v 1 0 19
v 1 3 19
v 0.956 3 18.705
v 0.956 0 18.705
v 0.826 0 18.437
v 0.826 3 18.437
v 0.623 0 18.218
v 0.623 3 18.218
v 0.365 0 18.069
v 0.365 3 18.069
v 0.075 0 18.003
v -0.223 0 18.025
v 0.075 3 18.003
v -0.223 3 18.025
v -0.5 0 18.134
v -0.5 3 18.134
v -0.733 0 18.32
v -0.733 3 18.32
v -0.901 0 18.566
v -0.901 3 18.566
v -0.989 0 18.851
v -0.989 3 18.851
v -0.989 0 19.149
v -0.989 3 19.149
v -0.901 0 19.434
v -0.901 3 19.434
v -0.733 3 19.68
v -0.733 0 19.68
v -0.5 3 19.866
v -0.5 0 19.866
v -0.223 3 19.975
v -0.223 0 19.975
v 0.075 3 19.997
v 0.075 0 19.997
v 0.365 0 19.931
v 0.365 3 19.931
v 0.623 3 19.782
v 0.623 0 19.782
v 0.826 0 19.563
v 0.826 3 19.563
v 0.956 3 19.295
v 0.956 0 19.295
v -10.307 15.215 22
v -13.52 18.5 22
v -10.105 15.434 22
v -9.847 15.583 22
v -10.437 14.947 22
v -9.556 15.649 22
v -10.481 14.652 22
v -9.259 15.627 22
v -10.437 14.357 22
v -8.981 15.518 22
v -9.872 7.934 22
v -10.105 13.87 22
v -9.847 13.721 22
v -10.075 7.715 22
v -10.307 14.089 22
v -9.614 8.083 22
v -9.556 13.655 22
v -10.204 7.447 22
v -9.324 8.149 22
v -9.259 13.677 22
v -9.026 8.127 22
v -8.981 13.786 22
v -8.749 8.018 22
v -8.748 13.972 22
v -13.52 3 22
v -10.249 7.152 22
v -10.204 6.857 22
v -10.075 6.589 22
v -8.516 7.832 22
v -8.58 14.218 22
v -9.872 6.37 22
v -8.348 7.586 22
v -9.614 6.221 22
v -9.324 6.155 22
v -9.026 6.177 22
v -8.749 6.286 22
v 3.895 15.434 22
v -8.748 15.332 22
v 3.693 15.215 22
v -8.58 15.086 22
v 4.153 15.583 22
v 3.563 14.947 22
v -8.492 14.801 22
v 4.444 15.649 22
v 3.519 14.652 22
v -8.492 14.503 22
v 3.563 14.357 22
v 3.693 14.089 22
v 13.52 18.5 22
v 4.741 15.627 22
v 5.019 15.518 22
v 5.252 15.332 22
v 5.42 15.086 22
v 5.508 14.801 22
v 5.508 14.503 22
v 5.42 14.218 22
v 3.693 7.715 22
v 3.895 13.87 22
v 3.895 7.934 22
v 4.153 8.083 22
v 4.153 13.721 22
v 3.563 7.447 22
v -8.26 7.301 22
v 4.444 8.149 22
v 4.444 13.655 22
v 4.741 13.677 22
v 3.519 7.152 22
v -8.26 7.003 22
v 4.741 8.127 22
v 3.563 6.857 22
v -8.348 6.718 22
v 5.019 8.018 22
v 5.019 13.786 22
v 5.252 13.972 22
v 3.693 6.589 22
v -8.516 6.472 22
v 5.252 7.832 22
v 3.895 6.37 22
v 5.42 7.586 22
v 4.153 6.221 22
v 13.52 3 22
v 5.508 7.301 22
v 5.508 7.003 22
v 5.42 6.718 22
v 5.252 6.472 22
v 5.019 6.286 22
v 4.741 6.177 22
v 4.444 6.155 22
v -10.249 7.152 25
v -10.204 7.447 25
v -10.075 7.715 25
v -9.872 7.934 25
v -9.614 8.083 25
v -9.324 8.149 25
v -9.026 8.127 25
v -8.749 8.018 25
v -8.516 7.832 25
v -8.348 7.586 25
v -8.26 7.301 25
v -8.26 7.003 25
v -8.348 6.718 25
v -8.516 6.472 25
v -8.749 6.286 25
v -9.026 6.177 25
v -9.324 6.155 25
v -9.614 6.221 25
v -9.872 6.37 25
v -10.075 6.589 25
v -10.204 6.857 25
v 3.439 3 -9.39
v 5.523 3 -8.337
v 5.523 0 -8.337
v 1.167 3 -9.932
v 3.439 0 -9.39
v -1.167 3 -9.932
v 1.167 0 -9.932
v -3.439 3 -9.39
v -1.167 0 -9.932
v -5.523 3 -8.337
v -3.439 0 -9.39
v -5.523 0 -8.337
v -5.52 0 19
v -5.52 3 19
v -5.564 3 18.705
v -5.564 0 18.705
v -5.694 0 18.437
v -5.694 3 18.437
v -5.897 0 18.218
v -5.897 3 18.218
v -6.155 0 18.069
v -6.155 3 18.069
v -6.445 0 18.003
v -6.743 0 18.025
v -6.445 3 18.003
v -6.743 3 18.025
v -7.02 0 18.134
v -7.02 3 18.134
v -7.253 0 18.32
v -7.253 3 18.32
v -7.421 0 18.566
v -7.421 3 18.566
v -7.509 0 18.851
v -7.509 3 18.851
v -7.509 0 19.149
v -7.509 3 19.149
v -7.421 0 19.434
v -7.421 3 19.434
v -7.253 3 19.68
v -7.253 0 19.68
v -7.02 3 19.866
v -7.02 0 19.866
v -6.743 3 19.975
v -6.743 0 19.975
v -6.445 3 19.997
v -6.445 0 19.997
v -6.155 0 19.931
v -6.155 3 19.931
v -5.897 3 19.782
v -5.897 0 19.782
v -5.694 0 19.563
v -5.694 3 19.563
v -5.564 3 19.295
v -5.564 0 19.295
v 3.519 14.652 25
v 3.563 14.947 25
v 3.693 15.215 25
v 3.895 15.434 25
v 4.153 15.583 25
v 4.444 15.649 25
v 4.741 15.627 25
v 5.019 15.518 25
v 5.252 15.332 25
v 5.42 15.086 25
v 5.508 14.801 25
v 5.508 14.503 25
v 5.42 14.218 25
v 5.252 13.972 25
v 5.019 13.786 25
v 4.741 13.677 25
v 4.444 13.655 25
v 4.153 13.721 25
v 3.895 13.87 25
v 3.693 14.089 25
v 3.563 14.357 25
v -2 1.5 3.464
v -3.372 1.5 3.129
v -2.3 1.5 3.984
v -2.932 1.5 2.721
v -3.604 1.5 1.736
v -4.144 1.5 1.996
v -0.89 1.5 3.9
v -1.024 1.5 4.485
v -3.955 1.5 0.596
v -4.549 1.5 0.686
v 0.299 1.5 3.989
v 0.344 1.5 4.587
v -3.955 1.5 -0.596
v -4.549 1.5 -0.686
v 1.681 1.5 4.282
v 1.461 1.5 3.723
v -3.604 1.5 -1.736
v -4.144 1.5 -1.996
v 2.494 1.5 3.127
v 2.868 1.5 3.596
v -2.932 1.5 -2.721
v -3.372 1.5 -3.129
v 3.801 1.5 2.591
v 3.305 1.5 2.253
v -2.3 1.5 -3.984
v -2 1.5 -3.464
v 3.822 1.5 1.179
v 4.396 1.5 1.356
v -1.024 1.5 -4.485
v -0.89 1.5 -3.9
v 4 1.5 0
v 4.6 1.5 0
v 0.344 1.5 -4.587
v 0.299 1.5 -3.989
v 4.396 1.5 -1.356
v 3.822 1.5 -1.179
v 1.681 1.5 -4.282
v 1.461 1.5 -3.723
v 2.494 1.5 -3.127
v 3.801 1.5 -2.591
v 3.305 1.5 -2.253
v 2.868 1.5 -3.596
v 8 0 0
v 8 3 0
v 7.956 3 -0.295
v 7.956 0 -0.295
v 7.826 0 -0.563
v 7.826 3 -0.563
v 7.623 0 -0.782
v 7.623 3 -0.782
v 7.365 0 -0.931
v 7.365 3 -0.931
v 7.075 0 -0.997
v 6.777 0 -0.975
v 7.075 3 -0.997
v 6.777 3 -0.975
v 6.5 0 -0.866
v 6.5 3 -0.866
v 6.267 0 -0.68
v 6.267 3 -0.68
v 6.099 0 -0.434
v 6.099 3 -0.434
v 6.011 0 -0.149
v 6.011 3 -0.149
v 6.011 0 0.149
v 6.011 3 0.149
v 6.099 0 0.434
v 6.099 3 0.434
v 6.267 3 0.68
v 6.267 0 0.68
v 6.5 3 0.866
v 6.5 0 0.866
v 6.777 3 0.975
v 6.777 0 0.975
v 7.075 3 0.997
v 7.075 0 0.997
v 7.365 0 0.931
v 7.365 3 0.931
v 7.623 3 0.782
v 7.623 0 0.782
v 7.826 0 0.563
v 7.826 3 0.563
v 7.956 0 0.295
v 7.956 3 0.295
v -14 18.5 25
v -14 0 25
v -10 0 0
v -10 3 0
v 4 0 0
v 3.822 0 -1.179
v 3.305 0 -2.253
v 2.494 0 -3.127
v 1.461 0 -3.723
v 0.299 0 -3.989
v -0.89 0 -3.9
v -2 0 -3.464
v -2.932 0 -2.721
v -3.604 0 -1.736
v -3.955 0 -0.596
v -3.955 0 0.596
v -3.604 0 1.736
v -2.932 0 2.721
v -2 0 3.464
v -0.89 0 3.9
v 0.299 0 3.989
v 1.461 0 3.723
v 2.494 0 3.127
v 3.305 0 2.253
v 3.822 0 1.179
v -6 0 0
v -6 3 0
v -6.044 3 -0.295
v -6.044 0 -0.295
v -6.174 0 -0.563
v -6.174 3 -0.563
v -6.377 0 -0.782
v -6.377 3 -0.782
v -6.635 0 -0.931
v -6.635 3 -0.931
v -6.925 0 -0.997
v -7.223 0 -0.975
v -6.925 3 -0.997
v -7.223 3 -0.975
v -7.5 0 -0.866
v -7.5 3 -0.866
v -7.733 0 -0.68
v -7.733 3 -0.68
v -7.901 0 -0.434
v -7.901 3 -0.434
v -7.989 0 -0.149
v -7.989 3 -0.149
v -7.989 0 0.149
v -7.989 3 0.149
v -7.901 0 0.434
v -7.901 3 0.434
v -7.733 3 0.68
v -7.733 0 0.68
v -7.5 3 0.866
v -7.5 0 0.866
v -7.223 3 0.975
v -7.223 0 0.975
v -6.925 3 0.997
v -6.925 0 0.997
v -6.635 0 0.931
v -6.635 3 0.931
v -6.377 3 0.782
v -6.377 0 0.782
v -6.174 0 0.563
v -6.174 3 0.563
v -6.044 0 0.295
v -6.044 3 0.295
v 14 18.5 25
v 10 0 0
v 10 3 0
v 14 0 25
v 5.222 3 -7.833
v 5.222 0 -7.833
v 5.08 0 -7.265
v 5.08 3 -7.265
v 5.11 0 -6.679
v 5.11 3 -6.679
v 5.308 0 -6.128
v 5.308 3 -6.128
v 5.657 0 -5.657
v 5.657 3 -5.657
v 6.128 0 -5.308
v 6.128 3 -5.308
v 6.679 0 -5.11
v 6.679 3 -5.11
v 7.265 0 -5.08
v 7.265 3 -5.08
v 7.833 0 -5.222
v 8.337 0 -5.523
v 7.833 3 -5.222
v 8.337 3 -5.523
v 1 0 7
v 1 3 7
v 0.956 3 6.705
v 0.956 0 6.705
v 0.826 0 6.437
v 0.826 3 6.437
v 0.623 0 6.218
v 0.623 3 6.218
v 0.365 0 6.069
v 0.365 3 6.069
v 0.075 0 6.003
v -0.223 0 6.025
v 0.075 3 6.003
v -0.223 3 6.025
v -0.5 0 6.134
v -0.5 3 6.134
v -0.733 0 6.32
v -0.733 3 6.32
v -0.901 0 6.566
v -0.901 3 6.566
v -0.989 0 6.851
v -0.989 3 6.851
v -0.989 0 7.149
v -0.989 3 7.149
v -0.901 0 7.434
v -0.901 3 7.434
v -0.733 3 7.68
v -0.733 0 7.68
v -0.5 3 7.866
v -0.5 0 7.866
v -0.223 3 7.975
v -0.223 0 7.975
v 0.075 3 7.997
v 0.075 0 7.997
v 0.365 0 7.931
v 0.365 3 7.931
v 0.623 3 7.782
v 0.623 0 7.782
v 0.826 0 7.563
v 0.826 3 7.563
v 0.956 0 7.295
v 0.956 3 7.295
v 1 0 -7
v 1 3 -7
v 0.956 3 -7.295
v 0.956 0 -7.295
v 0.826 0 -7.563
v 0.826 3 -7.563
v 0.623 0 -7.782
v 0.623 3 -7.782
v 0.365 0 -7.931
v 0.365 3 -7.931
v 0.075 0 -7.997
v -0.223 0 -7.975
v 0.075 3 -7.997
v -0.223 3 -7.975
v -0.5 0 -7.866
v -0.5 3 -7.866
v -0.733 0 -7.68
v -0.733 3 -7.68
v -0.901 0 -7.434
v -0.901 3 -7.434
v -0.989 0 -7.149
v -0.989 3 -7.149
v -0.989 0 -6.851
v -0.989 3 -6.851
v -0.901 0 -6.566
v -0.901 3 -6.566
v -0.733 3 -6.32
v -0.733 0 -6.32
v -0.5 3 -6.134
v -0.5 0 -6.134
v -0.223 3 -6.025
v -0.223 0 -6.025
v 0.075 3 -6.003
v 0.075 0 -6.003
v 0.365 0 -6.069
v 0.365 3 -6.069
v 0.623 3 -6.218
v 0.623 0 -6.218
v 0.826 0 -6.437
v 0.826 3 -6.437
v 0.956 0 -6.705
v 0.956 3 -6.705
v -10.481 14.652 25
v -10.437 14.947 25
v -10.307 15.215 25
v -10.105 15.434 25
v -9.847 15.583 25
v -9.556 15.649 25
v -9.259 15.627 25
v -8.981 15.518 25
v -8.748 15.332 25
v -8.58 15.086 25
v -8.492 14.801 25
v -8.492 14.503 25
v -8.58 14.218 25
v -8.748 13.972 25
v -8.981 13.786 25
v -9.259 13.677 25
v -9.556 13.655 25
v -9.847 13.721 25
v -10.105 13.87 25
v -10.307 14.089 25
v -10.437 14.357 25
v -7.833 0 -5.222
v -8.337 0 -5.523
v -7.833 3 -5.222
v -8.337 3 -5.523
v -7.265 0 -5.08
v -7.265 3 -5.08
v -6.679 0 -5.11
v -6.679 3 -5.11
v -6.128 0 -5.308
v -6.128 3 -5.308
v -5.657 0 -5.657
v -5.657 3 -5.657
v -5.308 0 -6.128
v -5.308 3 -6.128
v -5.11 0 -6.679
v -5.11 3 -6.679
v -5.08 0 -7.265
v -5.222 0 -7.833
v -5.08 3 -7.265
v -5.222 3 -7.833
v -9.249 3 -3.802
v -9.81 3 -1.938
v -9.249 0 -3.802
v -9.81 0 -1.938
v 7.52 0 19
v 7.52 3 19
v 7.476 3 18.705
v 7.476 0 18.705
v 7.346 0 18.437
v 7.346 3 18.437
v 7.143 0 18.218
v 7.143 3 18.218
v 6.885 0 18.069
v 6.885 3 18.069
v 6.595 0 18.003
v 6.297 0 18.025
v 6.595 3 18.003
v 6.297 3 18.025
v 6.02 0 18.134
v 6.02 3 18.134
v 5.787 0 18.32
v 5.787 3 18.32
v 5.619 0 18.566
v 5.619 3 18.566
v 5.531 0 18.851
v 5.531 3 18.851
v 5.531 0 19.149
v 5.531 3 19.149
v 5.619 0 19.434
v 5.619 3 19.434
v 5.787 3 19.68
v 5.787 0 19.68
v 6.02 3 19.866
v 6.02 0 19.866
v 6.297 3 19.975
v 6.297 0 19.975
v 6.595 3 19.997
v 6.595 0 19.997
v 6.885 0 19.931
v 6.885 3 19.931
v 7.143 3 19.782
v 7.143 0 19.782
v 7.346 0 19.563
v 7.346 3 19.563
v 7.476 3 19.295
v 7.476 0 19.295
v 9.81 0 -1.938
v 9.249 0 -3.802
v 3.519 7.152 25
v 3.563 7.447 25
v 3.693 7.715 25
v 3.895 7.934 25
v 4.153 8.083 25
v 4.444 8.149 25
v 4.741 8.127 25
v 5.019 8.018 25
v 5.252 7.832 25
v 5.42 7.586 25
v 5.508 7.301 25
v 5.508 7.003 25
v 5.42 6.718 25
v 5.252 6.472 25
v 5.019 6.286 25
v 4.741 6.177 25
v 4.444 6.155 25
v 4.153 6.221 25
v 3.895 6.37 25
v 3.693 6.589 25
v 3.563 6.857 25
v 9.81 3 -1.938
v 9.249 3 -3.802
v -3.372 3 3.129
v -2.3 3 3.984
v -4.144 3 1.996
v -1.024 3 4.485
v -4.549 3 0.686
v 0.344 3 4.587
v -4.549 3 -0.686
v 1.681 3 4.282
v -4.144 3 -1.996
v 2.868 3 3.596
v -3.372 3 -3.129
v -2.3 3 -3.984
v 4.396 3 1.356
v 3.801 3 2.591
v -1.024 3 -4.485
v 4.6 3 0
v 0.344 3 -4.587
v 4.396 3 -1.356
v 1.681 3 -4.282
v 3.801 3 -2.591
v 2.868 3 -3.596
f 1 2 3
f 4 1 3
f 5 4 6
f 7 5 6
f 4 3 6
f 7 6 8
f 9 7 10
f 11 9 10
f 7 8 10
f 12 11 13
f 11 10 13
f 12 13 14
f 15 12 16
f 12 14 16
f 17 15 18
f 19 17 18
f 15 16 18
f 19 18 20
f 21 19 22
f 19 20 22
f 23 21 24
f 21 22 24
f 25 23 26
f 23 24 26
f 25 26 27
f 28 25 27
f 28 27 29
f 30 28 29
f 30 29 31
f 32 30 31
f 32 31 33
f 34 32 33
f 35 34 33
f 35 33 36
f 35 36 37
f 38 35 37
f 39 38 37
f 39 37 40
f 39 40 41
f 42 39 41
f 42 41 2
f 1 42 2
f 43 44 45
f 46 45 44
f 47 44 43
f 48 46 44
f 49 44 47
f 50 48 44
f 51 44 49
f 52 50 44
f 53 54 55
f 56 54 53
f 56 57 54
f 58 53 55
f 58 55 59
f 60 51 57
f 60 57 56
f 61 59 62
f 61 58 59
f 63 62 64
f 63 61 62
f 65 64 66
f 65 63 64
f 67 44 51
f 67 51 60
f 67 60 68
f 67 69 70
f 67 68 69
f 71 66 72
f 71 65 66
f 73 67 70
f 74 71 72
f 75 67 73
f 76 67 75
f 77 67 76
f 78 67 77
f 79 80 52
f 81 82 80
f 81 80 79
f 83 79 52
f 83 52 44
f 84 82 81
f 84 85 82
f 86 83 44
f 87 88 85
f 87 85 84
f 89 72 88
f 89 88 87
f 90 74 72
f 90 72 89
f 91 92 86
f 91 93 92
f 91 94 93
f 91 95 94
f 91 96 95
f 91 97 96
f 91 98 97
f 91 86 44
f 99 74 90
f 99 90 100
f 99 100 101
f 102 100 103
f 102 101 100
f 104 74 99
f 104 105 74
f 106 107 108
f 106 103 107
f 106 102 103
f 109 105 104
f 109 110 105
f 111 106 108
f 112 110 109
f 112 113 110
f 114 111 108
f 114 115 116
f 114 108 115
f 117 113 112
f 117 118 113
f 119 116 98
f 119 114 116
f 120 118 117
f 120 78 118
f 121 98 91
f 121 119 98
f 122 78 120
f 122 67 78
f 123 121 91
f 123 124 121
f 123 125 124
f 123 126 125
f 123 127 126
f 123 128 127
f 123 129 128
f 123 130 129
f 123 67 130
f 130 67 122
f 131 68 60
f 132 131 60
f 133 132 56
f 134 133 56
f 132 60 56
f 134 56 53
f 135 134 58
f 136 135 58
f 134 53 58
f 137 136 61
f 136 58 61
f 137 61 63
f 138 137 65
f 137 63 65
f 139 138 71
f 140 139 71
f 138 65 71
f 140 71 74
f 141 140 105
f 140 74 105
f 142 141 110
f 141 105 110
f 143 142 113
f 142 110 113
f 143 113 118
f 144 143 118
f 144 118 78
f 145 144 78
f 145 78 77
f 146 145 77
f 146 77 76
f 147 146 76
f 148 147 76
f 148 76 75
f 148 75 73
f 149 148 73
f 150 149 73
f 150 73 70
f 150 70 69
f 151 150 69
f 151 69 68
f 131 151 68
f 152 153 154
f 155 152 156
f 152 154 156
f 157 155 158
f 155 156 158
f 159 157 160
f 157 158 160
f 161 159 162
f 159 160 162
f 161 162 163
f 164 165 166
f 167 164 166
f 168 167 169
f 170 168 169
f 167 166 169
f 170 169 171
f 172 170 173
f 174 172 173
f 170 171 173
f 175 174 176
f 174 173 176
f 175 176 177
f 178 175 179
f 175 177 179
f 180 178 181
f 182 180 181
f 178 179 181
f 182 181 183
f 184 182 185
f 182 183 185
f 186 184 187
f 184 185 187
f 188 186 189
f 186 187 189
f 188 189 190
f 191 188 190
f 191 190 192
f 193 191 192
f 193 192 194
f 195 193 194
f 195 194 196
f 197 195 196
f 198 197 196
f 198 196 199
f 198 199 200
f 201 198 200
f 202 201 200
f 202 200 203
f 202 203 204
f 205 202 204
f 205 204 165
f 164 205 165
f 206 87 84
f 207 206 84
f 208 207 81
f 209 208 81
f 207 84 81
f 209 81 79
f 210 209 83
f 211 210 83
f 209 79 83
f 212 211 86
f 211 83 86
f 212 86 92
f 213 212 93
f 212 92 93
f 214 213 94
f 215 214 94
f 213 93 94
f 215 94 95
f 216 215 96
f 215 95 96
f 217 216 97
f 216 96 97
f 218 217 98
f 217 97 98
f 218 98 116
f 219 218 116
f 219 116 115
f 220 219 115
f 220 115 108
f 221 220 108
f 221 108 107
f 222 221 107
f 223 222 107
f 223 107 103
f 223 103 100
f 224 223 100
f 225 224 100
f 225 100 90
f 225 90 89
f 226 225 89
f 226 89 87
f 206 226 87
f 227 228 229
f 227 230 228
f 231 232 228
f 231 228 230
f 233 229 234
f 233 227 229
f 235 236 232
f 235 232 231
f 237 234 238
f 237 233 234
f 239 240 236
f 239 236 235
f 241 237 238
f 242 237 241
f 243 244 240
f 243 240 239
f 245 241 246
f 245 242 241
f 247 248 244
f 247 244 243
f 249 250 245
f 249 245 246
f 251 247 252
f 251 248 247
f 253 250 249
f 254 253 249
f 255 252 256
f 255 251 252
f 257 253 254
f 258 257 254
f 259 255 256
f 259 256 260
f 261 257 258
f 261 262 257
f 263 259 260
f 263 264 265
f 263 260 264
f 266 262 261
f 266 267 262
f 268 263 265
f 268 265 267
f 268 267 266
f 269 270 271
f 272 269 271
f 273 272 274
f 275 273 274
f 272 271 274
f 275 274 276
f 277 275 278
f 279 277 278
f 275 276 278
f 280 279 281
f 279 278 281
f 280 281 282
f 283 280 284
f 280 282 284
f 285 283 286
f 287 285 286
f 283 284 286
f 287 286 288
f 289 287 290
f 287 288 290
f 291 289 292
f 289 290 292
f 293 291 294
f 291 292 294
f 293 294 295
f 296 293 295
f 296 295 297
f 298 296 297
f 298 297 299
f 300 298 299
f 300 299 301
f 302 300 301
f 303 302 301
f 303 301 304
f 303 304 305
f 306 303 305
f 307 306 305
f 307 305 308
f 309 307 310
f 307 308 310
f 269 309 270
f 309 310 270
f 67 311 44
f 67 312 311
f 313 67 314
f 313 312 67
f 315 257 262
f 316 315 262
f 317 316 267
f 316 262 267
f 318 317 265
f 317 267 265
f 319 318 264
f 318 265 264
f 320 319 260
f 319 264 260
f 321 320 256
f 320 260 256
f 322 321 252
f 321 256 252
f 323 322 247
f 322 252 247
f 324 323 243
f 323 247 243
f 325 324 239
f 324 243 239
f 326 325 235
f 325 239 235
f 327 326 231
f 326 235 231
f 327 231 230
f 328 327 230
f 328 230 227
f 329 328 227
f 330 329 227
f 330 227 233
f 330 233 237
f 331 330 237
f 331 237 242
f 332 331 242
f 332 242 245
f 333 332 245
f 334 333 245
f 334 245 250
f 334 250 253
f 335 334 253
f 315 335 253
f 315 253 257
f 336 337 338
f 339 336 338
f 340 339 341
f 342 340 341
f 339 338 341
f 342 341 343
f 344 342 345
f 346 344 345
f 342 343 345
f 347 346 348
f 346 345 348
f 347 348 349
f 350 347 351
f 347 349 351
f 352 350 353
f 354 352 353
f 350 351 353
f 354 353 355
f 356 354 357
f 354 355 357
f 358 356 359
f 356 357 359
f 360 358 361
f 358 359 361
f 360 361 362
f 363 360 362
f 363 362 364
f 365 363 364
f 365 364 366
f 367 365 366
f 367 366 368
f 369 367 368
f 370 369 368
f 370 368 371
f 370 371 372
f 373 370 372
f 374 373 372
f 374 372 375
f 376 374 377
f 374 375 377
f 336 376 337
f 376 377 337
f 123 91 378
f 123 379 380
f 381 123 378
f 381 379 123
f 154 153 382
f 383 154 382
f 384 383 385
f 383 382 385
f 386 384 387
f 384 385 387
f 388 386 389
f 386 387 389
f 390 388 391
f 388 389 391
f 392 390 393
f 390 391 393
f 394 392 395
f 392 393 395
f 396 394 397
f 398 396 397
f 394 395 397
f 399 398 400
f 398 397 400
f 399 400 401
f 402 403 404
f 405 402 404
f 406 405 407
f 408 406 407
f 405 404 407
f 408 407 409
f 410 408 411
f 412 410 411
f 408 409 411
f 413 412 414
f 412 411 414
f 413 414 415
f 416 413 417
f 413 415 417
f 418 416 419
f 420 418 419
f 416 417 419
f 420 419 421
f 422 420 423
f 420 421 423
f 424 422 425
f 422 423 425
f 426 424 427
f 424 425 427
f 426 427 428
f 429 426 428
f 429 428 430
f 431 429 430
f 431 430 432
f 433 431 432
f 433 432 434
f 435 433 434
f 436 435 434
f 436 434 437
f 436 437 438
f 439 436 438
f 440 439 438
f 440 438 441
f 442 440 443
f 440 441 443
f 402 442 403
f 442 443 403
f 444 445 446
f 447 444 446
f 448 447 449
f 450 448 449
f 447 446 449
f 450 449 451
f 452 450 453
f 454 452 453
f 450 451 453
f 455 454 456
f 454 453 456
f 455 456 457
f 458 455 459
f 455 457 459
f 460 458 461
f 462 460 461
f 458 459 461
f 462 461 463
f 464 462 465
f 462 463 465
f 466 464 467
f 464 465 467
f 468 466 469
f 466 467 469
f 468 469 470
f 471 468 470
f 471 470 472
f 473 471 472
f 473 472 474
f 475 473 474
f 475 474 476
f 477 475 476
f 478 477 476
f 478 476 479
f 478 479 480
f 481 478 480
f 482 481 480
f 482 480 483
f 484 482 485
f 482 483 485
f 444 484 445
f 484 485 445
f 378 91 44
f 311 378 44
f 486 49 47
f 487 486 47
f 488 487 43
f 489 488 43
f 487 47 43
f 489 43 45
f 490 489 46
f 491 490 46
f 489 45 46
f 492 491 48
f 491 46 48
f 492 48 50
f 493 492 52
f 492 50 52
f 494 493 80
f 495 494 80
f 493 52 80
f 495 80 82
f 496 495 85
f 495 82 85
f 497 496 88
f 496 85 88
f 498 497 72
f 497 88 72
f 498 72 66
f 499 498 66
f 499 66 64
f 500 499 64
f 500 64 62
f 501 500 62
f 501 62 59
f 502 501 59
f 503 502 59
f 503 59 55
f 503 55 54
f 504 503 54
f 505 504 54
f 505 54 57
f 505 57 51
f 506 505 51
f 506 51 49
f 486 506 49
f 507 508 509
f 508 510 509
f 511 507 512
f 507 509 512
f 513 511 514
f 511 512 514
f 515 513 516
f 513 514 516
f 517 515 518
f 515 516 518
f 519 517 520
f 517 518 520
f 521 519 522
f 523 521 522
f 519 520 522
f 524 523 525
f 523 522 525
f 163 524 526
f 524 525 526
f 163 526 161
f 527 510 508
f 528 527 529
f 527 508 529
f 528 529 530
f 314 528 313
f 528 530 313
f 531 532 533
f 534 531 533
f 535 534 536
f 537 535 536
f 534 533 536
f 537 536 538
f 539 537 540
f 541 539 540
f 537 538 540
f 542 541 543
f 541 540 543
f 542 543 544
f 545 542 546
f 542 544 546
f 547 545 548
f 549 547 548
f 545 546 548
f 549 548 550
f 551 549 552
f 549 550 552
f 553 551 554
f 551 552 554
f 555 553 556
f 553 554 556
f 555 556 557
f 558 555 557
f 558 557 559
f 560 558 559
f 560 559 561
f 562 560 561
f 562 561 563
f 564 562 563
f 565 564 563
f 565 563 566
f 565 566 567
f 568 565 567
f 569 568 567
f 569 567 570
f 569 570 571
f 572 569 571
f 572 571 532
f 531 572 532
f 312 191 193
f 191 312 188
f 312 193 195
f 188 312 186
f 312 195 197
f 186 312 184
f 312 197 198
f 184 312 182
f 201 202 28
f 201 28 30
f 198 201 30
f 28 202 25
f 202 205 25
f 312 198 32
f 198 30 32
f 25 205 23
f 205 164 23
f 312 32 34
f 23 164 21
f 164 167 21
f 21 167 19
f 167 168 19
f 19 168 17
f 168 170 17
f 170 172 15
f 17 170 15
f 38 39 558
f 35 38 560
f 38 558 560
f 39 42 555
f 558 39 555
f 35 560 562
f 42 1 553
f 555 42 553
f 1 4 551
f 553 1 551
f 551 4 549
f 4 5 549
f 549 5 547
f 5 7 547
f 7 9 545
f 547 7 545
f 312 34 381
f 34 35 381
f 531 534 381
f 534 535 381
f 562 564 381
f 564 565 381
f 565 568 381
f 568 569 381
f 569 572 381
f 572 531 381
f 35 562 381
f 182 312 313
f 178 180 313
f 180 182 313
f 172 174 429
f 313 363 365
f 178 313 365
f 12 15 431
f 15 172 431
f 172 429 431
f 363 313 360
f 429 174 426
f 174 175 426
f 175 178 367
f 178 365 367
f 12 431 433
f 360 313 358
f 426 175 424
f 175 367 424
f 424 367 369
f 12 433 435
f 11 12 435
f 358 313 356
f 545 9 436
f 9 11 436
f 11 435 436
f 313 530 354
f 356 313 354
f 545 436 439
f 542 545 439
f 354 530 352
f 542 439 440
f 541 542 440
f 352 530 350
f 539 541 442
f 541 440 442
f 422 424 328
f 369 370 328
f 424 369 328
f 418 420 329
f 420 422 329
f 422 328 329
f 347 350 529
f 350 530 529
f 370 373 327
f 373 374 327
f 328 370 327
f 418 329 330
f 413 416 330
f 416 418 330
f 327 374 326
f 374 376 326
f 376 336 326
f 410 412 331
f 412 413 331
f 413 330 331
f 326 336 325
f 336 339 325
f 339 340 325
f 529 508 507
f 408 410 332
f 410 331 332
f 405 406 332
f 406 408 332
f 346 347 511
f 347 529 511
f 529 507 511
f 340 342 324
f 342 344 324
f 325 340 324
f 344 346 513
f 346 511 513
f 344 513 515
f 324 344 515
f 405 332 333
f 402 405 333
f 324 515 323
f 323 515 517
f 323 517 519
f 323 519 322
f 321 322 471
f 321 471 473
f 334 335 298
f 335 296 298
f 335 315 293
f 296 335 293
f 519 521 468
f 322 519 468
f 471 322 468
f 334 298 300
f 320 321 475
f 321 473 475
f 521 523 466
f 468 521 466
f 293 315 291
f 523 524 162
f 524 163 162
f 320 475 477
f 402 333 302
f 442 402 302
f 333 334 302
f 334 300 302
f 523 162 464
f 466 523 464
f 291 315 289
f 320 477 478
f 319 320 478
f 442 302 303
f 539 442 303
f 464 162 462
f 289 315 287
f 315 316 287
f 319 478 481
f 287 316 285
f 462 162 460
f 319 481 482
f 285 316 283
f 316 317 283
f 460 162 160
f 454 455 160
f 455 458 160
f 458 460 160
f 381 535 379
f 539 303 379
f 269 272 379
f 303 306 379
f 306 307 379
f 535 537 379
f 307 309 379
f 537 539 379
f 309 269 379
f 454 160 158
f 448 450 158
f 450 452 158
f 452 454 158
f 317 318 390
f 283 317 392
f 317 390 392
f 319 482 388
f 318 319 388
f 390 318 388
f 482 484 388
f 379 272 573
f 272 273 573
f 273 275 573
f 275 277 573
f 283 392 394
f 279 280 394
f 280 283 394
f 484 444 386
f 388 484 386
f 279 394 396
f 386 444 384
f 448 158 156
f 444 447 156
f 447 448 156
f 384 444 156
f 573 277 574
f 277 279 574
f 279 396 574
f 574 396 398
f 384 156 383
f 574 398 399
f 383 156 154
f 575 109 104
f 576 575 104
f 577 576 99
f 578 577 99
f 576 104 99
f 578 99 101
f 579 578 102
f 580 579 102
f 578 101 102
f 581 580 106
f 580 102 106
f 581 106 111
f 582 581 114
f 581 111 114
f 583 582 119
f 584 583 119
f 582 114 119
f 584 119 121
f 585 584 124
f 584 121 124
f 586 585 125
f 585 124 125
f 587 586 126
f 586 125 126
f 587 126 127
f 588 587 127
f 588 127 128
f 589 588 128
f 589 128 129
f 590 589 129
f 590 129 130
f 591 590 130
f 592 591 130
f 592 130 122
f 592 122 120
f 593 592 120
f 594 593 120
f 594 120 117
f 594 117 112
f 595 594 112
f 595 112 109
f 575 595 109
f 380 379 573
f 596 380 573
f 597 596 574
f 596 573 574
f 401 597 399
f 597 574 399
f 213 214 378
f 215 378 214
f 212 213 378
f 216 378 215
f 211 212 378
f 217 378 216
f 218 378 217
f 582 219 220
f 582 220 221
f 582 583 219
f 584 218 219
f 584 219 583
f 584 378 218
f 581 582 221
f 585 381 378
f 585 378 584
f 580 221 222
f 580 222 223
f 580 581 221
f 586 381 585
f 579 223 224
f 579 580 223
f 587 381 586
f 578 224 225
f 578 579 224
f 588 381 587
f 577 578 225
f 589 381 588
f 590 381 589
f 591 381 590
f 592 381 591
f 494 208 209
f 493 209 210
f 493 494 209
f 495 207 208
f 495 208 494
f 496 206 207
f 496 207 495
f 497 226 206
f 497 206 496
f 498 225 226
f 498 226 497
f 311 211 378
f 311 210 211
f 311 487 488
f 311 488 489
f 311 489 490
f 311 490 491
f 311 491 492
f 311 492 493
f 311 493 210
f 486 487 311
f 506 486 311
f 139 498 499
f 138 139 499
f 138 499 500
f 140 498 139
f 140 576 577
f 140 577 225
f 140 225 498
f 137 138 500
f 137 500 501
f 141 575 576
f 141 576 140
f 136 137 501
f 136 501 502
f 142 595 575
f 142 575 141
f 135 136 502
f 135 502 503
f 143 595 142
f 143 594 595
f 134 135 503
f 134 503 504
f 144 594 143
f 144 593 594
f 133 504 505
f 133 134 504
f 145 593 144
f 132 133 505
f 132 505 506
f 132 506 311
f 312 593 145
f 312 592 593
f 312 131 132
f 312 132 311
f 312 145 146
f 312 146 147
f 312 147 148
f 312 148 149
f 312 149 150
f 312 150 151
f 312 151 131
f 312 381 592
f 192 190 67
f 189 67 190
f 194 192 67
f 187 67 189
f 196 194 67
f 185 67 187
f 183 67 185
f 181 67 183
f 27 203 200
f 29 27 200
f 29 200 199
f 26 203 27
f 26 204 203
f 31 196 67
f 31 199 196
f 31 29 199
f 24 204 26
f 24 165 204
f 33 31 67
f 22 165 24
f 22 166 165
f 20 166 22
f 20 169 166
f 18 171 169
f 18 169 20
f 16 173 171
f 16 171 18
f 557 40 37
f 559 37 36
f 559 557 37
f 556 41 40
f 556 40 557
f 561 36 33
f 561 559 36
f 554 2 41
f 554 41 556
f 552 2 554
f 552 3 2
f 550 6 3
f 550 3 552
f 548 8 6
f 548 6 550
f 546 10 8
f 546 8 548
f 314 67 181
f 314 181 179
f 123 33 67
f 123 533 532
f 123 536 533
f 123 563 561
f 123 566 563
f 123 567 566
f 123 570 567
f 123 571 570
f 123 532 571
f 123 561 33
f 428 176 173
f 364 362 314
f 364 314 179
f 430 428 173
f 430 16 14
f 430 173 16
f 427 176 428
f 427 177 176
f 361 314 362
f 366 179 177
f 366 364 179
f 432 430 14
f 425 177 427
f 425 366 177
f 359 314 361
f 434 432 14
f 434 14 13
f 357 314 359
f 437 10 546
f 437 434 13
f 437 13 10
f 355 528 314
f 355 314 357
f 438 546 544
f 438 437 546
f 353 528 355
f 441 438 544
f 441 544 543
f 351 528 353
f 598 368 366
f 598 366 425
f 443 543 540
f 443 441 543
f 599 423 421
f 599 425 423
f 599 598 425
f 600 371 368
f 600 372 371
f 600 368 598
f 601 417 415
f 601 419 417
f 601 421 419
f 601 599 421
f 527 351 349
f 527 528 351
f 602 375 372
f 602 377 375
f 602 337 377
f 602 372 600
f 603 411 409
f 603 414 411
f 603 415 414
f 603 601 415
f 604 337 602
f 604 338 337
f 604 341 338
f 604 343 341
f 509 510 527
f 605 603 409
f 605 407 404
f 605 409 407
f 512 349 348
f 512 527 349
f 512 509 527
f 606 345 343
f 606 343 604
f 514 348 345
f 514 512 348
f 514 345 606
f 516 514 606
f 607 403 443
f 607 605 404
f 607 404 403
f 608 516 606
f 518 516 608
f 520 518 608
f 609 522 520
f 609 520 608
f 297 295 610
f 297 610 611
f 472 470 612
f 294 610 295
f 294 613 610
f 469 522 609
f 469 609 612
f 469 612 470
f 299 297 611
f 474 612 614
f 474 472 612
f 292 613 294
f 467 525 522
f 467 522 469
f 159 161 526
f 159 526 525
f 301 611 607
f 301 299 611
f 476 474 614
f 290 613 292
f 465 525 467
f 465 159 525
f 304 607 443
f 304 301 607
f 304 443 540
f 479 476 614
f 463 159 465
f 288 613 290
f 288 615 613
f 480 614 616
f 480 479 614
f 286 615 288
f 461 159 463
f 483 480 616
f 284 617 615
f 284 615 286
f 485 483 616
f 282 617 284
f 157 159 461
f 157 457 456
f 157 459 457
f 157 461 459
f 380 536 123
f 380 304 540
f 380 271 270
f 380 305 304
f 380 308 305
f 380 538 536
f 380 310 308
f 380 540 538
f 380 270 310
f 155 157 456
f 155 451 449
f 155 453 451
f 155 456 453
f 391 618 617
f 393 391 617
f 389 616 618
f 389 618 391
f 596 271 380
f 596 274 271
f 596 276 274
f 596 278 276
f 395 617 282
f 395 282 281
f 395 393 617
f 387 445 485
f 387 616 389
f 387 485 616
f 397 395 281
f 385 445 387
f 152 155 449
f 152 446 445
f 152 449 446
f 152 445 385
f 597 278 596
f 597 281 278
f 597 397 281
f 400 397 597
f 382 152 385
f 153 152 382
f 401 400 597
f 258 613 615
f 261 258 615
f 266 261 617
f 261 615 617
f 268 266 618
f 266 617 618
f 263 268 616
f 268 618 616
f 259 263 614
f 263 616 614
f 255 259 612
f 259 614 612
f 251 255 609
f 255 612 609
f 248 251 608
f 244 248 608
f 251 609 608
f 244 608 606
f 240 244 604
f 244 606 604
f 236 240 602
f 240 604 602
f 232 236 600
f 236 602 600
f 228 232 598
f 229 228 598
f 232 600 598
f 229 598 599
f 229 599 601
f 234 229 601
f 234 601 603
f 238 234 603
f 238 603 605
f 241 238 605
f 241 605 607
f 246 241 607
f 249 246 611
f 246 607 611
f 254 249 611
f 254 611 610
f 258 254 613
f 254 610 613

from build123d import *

# Parameters (mm, degrees)
BOSS_EXTRUDE1_DEPTH = 3
SKETCH2_R           = 4
CUT_EXTRUDE1_DEPTH  = 13
SKETCH3_R           = 1
CUT_EXTRUDE2_DEPTH  = 13
SKETCH4_R           = 1
CUT_EXTRUDE3_DEPTH  = 3
BOSS_EXTRUDE2_DEPTH = 15.5
SKETCH6_R           = 4.6
CUT_EXTRUDE4_DEPTH  = 1.5
SKETCH7_R           = 2
CUT_EXTRUDE5_DEPTH  = 10
SKETCH8_R           = 1
CUT_EXTRUDE6_DEPTH  = 10


with BuildPart() as part:
    # Sketch1 → Boss-Extrude1 (new body)
    with BuildSketch(Plane(origin=(0, 0, 0), x_dir=(1, 0, 0), z_dir=(0, 1, 0))):
        with BuildLine():
            Line((-10, 0), (-14, -25))
            Line((-14, -25), (14, -25))
            Line((14, -25), (10, 0))
            ThreePointArc((10, 0), (0, 10), (-10, 0))
        make_face()
    extrude(amount=BOSS_EXTRUDE1_DEPTH)

    # Sketch2 → Cut-Extrude1 (cut)
    with BuildSketch(Plane(origin=(0, 3, 0), x_dir=(1, 0, 0), z_dir=(0, 1, 0))):
        Circle(SKETCH2_R)
    extrude(amount=-CUT_EXTRUDE1_DEPTH, mode=Mode.SUBTRACT)

    # Sketch3 → Cut-Extrude2 (cut)
    with BuildSketch(Plane(origin=(0, 3, 0), x_dir=(1, 0, 0), z_dir=(0, 1, 0))):
        with Locations((-6.52, -19)):
            Circle(SKETCH3_R)
        with Locations((6.52, -19)):
            Circle(SKETCH3_R)
        with Locations((0, -19)):
            Circle(SKETCH3_R)
    extrude(amount=-CUT_EXTRUDE2_DEPTH, mode=Mode.SUBTRACT)

    # Sketch4 → Cut-Extrude3 (cut)
    with BuildSketch(Plane(origin=(0, 3, 0), x_dir=(1, 0, 0), z_dir=(0, 1, 0))):
        with Locations((0, -7)):
            Circle(SKETCH4_R)
        with Locations((-7, 0)):
            Circle(SKETCH4_R)
        with Locations((0, 7)):
            Circle(SKETCH4_R)
        with Locations((7, 0)):
            Circle(SKETCH4_R)
    extrude(amount=-CUT_EXTRUDE3_DEPTH, mode=Mode.SUBTRACT)

    # Sketch5 → Boss-Extrude2 (add)
    with BuildSketch(Plane(origin=(0, 3, 0), x_dir=(1, 0, 0), z_dir=(0, 1, 0))):
        Polygon((-13.52, -22), (13.52, -22), (14, -25), (-14, -25), align=None)
    extrude(amount=BOSS_EXTRUDE2_DEPTH)

    # Sketch6 → Cut-Extrude4 (cut)
    with BuildSketch(Plane(origin=(0, 3, 0), x_dir=(1, 0, 0), z_dir=(0, 1, 0))):
        Circle(SKETCH6_R)
    extrude(amount=-CUT_EXTRUDE4_DEPTH, mode=Mode.SUBTRACT)

    # Sketch7 → Cut-Extrude5 (cut)
    with BuildSketch(Plane(origin=(0, 3, 0), x_dir=(1, 0, 0), z_dir=(0, 1, 0))):
        with Locations((-7.071067812, 7.071067812)):
            Circle(SKETCH7_R)
        with Locations((7.071067812, 7.071067812)):
            Circle(SKETCH7_R)
    extrude(amount=-CUT_EXTRUDE5_DEPTH, mode=Mode.SUBTRACT)

    # Sketch8 → Cut-Extrude6 (cut)
    with BuildSketch(Plane(origin=(0, 0, 22), x_dir=(-1, 0, 0), z_dir=(0, 0, -1))):
        with Locations((-4.518775135, 7.151837118)):
            Circle(SKETCH8_R)
        with Locations((-4.518775135, 14.651837118)):
            Circle(SKETCH8_R)
        with Locations((9.481224865, 14.651837118)):
            Circle(SKETCH8_R)
        with Locations((9.248832445, 7.151837118)):
            Circle(SKETCH8_R)
    extrude(amount=-CUT_EXTRUDE6_DEPTH, mode=Mode.SUBTRACT)


solid = part.part
